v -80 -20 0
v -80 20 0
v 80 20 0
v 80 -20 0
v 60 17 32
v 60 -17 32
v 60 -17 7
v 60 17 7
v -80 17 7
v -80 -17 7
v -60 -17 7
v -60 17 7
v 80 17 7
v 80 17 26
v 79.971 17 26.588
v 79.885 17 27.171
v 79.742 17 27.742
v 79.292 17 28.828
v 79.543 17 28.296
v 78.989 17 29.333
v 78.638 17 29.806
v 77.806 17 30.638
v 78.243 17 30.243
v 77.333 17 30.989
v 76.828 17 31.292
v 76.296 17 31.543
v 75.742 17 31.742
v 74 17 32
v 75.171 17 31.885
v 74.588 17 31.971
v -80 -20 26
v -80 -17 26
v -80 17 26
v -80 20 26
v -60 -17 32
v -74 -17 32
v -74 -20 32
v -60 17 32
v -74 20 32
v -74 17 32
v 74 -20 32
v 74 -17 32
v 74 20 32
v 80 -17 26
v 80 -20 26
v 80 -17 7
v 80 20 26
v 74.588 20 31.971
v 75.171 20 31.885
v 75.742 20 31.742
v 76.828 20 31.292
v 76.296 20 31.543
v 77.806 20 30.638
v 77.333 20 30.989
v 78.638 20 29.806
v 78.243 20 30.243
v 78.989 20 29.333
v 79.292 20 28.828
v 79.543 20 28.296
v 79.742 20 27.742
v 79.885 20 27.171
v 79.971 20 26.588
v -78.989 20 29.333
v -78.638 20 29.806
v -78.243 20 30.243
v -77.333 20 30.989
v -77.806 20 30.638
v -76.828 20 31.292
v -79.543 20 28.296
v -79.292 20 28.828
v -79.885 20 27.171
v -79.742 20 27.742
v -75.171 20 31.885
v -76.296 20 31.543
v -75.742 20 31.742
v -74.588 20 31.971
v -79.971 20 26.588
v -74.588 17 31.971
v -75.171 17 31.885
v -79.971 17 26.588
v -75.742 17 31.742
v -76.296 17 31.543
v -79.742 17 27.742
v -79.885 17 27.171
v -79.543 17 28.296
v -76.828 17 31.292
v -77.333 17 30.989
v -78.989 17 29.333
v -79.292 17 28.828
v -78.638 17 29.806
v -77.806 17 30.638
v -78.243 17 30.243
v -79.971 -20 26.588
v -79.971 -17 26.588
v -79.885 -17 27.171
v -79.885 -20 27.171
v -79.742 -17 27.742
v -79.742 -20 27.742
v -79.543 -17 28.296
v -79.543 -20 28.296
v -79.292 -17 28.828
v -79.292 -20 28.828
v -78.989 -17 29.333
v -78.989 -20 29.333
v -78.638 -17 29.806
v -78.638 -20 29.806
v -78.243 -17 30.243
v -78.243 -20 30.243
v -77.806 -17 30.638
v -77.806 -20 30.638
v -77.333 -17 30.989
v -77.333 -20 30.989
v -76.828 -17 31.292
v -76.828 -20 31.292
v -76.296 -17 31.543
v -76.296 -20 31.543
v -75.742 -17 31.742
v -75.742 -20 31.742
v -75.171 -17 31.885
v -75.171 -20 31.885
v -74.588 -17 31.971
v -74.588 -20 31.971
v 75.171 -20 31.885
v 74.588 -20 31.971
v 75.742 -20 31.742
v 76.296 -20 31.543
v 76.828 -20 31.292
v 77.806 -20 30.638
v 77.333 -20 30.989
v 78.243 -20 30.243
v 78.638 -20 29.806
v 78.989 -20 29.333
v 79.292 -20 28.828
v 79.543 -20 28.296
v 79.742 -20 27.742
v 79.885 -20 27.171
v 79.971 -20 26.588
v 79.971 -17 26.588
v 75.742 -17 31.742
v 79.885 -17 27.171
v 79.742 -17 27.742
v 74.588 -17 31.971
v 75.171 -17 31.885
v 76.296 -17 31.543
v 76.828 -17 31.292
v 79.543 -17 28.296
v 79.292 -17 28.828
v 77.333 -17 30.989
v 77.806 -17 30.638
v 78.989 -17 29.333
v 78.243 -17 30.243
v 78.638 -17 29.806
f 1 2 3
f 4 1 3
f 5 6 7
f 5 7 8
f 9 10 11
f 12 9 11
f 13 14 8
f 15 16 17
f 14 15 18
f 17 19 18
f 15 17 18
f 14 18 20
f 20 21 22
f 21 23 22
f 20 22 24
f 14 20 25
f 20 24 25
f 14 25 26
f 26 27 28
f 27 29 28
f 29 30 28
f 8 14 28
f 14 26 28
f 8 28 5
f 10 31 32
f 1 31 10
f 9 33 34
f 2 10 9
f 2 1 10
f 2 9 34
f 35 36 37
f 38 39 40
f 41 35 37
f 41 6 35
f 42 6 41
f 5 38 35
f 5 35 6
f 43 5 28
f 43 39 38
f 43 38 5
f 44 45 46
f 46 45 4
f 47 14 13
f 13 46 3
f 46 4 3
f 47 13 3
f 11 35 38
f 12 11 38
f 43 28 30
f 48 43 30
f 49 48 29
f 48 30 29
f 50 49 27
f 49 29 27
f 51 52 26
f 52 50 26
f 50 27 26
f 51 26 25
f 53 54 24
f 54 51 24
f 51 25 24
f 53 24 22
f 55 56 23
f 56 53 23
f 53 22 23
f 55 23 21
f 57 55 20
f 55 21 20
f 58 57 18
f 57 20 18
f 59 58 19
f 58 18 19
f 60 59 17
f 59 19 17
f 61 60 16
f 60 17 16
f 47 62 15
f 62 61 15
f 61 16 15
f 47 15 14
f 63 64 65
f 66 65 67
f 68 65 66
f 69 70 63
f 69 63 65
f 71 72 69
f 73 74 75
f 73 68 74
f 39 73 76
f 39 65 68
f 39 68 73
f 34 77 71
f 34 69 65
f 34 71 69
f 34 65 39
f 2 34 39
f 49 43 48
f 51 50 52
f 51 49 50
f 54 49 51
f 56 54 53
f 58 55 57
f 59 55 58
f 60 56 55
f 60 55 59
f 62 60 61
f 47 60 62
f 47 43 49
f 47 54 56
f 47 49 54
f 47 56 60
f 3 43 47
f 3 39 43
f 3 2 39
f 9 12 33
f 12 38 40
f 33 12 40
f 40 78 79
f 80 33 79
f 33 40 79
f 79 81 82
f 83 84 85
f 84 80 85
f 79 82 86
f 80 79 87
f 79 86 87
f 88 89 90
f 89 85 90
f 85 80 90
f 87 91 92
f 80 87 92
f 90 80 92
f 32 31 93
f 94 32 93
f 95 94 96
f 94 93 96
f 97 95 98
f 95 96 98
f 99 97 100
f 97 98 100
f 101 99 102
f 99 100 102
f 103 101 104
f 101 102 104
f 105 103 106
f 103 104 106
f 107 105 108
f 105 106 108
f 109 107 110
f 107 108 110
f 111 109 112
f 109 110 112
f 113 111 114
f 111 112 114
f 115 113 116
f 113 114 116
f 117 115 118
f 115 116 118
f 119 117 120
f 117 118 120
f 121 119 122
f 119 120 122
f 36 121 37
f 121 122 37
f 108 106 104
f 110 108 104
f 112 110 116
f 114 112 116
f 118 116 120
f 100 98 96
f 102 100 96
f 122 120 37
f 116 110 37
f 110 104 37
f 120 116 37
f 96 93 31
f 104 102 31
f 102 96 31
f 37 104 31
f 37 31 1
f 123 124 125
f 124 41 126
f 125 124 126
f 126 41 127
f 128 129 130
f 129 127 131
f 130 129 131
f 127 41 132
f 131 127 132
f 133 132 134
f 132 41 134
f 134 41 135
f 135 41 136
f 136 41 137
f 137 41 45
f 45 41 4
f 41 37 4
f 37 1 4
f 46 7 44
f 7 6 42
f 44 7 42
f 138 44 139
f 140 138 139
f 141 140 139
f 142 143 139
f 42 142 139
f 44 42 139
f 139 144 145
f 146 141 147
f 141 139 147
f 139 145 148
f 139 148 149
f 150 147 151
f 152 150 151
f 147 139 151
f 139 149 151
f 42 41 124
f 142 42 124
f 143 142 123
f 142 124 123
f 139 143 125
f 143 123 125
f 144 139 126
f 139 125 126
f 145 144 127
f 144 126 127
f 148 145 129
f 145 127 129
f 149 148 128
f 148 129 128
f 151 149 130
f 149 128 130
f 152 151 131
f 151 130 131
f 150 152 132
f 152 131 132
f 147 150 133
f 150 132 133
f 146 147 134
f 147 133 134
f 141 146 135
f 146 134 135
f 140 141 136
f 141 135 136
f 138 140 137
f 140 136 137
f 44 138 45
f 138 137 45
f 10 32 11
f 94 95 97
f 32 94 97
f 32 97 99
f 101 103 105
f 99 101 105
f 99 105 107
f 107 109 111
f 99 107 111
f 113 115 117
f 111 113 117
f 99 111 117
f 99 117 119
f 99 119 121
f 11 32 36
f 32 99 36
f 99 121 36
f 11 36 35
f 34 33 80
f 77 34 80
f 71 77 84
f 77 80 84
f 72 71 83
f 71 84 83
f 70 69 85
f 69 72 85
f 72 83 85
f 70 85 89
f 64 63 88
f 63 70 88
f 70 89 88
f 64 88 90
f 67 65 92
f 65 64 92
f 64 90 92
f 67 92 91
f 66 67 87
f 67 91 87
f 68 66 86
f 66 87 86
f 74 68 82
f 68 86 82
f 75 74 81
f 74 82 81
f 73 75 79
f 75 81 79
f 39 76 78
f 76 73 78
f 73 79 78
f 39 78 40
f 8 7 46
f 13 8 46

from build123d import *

# Parameters (mm, degrees)
F0_W     = 160
F0_H     = 40
F1_DEPTH = 32
F3_DEPTH = 40.001
F4_W     = 6
F4_H     = 34
F4_W_2   = 14
F5_DEPTH = 25


with BuildPart() as f1:
    # F0 (on Top) → F1 (new body)
    with BuildSketch(Plane.XY):
        Rectangle(F0_W, F0_H)
    extrude(amount=F1_DEPTH)

    # F2 (on face) → F3 (cut, through all)
    with BuildSketch(Plane.XZ.offset(20)):
        with BuildLine():
            ThreePointArc((-80, 26), (-78.2426406871, 30.2426406871), (-74, 32))
            Line((-74, 32), (-80, 32))
            Line((-80, 32), (-80, 26))
        make_face()
        with BuildLine():
            Line((80, 32), (74, 32))
            ThreePointArc((74, 32), (78.2426406871, 30.2426406871), (80, 26))
            Line((80, 26), (80, 32))
        make_face()
    extrude(amount=-F3_DEPTH, mode=Mode.SUBTRACT)

    # F4 (on face) → F5 (cut)
    with BuildSketch(Plane.XY.offset(32)):
        with Locations((77, 0)):
            Rectangle(F4_W, F4_H)
        with Locations((-67, 0)):
            Rectangle(F4_W_2, F4_H)
        with Locations((67, 0)):
            Rectangle(F4_W_2, F4_H)
        with Locations((-77, 0)):
            Rectangle(F4_W, F4_H)
    extrude(amount=-F5_DEPTH, mode=Mode.SUBTRACT)


solid = f1.part
